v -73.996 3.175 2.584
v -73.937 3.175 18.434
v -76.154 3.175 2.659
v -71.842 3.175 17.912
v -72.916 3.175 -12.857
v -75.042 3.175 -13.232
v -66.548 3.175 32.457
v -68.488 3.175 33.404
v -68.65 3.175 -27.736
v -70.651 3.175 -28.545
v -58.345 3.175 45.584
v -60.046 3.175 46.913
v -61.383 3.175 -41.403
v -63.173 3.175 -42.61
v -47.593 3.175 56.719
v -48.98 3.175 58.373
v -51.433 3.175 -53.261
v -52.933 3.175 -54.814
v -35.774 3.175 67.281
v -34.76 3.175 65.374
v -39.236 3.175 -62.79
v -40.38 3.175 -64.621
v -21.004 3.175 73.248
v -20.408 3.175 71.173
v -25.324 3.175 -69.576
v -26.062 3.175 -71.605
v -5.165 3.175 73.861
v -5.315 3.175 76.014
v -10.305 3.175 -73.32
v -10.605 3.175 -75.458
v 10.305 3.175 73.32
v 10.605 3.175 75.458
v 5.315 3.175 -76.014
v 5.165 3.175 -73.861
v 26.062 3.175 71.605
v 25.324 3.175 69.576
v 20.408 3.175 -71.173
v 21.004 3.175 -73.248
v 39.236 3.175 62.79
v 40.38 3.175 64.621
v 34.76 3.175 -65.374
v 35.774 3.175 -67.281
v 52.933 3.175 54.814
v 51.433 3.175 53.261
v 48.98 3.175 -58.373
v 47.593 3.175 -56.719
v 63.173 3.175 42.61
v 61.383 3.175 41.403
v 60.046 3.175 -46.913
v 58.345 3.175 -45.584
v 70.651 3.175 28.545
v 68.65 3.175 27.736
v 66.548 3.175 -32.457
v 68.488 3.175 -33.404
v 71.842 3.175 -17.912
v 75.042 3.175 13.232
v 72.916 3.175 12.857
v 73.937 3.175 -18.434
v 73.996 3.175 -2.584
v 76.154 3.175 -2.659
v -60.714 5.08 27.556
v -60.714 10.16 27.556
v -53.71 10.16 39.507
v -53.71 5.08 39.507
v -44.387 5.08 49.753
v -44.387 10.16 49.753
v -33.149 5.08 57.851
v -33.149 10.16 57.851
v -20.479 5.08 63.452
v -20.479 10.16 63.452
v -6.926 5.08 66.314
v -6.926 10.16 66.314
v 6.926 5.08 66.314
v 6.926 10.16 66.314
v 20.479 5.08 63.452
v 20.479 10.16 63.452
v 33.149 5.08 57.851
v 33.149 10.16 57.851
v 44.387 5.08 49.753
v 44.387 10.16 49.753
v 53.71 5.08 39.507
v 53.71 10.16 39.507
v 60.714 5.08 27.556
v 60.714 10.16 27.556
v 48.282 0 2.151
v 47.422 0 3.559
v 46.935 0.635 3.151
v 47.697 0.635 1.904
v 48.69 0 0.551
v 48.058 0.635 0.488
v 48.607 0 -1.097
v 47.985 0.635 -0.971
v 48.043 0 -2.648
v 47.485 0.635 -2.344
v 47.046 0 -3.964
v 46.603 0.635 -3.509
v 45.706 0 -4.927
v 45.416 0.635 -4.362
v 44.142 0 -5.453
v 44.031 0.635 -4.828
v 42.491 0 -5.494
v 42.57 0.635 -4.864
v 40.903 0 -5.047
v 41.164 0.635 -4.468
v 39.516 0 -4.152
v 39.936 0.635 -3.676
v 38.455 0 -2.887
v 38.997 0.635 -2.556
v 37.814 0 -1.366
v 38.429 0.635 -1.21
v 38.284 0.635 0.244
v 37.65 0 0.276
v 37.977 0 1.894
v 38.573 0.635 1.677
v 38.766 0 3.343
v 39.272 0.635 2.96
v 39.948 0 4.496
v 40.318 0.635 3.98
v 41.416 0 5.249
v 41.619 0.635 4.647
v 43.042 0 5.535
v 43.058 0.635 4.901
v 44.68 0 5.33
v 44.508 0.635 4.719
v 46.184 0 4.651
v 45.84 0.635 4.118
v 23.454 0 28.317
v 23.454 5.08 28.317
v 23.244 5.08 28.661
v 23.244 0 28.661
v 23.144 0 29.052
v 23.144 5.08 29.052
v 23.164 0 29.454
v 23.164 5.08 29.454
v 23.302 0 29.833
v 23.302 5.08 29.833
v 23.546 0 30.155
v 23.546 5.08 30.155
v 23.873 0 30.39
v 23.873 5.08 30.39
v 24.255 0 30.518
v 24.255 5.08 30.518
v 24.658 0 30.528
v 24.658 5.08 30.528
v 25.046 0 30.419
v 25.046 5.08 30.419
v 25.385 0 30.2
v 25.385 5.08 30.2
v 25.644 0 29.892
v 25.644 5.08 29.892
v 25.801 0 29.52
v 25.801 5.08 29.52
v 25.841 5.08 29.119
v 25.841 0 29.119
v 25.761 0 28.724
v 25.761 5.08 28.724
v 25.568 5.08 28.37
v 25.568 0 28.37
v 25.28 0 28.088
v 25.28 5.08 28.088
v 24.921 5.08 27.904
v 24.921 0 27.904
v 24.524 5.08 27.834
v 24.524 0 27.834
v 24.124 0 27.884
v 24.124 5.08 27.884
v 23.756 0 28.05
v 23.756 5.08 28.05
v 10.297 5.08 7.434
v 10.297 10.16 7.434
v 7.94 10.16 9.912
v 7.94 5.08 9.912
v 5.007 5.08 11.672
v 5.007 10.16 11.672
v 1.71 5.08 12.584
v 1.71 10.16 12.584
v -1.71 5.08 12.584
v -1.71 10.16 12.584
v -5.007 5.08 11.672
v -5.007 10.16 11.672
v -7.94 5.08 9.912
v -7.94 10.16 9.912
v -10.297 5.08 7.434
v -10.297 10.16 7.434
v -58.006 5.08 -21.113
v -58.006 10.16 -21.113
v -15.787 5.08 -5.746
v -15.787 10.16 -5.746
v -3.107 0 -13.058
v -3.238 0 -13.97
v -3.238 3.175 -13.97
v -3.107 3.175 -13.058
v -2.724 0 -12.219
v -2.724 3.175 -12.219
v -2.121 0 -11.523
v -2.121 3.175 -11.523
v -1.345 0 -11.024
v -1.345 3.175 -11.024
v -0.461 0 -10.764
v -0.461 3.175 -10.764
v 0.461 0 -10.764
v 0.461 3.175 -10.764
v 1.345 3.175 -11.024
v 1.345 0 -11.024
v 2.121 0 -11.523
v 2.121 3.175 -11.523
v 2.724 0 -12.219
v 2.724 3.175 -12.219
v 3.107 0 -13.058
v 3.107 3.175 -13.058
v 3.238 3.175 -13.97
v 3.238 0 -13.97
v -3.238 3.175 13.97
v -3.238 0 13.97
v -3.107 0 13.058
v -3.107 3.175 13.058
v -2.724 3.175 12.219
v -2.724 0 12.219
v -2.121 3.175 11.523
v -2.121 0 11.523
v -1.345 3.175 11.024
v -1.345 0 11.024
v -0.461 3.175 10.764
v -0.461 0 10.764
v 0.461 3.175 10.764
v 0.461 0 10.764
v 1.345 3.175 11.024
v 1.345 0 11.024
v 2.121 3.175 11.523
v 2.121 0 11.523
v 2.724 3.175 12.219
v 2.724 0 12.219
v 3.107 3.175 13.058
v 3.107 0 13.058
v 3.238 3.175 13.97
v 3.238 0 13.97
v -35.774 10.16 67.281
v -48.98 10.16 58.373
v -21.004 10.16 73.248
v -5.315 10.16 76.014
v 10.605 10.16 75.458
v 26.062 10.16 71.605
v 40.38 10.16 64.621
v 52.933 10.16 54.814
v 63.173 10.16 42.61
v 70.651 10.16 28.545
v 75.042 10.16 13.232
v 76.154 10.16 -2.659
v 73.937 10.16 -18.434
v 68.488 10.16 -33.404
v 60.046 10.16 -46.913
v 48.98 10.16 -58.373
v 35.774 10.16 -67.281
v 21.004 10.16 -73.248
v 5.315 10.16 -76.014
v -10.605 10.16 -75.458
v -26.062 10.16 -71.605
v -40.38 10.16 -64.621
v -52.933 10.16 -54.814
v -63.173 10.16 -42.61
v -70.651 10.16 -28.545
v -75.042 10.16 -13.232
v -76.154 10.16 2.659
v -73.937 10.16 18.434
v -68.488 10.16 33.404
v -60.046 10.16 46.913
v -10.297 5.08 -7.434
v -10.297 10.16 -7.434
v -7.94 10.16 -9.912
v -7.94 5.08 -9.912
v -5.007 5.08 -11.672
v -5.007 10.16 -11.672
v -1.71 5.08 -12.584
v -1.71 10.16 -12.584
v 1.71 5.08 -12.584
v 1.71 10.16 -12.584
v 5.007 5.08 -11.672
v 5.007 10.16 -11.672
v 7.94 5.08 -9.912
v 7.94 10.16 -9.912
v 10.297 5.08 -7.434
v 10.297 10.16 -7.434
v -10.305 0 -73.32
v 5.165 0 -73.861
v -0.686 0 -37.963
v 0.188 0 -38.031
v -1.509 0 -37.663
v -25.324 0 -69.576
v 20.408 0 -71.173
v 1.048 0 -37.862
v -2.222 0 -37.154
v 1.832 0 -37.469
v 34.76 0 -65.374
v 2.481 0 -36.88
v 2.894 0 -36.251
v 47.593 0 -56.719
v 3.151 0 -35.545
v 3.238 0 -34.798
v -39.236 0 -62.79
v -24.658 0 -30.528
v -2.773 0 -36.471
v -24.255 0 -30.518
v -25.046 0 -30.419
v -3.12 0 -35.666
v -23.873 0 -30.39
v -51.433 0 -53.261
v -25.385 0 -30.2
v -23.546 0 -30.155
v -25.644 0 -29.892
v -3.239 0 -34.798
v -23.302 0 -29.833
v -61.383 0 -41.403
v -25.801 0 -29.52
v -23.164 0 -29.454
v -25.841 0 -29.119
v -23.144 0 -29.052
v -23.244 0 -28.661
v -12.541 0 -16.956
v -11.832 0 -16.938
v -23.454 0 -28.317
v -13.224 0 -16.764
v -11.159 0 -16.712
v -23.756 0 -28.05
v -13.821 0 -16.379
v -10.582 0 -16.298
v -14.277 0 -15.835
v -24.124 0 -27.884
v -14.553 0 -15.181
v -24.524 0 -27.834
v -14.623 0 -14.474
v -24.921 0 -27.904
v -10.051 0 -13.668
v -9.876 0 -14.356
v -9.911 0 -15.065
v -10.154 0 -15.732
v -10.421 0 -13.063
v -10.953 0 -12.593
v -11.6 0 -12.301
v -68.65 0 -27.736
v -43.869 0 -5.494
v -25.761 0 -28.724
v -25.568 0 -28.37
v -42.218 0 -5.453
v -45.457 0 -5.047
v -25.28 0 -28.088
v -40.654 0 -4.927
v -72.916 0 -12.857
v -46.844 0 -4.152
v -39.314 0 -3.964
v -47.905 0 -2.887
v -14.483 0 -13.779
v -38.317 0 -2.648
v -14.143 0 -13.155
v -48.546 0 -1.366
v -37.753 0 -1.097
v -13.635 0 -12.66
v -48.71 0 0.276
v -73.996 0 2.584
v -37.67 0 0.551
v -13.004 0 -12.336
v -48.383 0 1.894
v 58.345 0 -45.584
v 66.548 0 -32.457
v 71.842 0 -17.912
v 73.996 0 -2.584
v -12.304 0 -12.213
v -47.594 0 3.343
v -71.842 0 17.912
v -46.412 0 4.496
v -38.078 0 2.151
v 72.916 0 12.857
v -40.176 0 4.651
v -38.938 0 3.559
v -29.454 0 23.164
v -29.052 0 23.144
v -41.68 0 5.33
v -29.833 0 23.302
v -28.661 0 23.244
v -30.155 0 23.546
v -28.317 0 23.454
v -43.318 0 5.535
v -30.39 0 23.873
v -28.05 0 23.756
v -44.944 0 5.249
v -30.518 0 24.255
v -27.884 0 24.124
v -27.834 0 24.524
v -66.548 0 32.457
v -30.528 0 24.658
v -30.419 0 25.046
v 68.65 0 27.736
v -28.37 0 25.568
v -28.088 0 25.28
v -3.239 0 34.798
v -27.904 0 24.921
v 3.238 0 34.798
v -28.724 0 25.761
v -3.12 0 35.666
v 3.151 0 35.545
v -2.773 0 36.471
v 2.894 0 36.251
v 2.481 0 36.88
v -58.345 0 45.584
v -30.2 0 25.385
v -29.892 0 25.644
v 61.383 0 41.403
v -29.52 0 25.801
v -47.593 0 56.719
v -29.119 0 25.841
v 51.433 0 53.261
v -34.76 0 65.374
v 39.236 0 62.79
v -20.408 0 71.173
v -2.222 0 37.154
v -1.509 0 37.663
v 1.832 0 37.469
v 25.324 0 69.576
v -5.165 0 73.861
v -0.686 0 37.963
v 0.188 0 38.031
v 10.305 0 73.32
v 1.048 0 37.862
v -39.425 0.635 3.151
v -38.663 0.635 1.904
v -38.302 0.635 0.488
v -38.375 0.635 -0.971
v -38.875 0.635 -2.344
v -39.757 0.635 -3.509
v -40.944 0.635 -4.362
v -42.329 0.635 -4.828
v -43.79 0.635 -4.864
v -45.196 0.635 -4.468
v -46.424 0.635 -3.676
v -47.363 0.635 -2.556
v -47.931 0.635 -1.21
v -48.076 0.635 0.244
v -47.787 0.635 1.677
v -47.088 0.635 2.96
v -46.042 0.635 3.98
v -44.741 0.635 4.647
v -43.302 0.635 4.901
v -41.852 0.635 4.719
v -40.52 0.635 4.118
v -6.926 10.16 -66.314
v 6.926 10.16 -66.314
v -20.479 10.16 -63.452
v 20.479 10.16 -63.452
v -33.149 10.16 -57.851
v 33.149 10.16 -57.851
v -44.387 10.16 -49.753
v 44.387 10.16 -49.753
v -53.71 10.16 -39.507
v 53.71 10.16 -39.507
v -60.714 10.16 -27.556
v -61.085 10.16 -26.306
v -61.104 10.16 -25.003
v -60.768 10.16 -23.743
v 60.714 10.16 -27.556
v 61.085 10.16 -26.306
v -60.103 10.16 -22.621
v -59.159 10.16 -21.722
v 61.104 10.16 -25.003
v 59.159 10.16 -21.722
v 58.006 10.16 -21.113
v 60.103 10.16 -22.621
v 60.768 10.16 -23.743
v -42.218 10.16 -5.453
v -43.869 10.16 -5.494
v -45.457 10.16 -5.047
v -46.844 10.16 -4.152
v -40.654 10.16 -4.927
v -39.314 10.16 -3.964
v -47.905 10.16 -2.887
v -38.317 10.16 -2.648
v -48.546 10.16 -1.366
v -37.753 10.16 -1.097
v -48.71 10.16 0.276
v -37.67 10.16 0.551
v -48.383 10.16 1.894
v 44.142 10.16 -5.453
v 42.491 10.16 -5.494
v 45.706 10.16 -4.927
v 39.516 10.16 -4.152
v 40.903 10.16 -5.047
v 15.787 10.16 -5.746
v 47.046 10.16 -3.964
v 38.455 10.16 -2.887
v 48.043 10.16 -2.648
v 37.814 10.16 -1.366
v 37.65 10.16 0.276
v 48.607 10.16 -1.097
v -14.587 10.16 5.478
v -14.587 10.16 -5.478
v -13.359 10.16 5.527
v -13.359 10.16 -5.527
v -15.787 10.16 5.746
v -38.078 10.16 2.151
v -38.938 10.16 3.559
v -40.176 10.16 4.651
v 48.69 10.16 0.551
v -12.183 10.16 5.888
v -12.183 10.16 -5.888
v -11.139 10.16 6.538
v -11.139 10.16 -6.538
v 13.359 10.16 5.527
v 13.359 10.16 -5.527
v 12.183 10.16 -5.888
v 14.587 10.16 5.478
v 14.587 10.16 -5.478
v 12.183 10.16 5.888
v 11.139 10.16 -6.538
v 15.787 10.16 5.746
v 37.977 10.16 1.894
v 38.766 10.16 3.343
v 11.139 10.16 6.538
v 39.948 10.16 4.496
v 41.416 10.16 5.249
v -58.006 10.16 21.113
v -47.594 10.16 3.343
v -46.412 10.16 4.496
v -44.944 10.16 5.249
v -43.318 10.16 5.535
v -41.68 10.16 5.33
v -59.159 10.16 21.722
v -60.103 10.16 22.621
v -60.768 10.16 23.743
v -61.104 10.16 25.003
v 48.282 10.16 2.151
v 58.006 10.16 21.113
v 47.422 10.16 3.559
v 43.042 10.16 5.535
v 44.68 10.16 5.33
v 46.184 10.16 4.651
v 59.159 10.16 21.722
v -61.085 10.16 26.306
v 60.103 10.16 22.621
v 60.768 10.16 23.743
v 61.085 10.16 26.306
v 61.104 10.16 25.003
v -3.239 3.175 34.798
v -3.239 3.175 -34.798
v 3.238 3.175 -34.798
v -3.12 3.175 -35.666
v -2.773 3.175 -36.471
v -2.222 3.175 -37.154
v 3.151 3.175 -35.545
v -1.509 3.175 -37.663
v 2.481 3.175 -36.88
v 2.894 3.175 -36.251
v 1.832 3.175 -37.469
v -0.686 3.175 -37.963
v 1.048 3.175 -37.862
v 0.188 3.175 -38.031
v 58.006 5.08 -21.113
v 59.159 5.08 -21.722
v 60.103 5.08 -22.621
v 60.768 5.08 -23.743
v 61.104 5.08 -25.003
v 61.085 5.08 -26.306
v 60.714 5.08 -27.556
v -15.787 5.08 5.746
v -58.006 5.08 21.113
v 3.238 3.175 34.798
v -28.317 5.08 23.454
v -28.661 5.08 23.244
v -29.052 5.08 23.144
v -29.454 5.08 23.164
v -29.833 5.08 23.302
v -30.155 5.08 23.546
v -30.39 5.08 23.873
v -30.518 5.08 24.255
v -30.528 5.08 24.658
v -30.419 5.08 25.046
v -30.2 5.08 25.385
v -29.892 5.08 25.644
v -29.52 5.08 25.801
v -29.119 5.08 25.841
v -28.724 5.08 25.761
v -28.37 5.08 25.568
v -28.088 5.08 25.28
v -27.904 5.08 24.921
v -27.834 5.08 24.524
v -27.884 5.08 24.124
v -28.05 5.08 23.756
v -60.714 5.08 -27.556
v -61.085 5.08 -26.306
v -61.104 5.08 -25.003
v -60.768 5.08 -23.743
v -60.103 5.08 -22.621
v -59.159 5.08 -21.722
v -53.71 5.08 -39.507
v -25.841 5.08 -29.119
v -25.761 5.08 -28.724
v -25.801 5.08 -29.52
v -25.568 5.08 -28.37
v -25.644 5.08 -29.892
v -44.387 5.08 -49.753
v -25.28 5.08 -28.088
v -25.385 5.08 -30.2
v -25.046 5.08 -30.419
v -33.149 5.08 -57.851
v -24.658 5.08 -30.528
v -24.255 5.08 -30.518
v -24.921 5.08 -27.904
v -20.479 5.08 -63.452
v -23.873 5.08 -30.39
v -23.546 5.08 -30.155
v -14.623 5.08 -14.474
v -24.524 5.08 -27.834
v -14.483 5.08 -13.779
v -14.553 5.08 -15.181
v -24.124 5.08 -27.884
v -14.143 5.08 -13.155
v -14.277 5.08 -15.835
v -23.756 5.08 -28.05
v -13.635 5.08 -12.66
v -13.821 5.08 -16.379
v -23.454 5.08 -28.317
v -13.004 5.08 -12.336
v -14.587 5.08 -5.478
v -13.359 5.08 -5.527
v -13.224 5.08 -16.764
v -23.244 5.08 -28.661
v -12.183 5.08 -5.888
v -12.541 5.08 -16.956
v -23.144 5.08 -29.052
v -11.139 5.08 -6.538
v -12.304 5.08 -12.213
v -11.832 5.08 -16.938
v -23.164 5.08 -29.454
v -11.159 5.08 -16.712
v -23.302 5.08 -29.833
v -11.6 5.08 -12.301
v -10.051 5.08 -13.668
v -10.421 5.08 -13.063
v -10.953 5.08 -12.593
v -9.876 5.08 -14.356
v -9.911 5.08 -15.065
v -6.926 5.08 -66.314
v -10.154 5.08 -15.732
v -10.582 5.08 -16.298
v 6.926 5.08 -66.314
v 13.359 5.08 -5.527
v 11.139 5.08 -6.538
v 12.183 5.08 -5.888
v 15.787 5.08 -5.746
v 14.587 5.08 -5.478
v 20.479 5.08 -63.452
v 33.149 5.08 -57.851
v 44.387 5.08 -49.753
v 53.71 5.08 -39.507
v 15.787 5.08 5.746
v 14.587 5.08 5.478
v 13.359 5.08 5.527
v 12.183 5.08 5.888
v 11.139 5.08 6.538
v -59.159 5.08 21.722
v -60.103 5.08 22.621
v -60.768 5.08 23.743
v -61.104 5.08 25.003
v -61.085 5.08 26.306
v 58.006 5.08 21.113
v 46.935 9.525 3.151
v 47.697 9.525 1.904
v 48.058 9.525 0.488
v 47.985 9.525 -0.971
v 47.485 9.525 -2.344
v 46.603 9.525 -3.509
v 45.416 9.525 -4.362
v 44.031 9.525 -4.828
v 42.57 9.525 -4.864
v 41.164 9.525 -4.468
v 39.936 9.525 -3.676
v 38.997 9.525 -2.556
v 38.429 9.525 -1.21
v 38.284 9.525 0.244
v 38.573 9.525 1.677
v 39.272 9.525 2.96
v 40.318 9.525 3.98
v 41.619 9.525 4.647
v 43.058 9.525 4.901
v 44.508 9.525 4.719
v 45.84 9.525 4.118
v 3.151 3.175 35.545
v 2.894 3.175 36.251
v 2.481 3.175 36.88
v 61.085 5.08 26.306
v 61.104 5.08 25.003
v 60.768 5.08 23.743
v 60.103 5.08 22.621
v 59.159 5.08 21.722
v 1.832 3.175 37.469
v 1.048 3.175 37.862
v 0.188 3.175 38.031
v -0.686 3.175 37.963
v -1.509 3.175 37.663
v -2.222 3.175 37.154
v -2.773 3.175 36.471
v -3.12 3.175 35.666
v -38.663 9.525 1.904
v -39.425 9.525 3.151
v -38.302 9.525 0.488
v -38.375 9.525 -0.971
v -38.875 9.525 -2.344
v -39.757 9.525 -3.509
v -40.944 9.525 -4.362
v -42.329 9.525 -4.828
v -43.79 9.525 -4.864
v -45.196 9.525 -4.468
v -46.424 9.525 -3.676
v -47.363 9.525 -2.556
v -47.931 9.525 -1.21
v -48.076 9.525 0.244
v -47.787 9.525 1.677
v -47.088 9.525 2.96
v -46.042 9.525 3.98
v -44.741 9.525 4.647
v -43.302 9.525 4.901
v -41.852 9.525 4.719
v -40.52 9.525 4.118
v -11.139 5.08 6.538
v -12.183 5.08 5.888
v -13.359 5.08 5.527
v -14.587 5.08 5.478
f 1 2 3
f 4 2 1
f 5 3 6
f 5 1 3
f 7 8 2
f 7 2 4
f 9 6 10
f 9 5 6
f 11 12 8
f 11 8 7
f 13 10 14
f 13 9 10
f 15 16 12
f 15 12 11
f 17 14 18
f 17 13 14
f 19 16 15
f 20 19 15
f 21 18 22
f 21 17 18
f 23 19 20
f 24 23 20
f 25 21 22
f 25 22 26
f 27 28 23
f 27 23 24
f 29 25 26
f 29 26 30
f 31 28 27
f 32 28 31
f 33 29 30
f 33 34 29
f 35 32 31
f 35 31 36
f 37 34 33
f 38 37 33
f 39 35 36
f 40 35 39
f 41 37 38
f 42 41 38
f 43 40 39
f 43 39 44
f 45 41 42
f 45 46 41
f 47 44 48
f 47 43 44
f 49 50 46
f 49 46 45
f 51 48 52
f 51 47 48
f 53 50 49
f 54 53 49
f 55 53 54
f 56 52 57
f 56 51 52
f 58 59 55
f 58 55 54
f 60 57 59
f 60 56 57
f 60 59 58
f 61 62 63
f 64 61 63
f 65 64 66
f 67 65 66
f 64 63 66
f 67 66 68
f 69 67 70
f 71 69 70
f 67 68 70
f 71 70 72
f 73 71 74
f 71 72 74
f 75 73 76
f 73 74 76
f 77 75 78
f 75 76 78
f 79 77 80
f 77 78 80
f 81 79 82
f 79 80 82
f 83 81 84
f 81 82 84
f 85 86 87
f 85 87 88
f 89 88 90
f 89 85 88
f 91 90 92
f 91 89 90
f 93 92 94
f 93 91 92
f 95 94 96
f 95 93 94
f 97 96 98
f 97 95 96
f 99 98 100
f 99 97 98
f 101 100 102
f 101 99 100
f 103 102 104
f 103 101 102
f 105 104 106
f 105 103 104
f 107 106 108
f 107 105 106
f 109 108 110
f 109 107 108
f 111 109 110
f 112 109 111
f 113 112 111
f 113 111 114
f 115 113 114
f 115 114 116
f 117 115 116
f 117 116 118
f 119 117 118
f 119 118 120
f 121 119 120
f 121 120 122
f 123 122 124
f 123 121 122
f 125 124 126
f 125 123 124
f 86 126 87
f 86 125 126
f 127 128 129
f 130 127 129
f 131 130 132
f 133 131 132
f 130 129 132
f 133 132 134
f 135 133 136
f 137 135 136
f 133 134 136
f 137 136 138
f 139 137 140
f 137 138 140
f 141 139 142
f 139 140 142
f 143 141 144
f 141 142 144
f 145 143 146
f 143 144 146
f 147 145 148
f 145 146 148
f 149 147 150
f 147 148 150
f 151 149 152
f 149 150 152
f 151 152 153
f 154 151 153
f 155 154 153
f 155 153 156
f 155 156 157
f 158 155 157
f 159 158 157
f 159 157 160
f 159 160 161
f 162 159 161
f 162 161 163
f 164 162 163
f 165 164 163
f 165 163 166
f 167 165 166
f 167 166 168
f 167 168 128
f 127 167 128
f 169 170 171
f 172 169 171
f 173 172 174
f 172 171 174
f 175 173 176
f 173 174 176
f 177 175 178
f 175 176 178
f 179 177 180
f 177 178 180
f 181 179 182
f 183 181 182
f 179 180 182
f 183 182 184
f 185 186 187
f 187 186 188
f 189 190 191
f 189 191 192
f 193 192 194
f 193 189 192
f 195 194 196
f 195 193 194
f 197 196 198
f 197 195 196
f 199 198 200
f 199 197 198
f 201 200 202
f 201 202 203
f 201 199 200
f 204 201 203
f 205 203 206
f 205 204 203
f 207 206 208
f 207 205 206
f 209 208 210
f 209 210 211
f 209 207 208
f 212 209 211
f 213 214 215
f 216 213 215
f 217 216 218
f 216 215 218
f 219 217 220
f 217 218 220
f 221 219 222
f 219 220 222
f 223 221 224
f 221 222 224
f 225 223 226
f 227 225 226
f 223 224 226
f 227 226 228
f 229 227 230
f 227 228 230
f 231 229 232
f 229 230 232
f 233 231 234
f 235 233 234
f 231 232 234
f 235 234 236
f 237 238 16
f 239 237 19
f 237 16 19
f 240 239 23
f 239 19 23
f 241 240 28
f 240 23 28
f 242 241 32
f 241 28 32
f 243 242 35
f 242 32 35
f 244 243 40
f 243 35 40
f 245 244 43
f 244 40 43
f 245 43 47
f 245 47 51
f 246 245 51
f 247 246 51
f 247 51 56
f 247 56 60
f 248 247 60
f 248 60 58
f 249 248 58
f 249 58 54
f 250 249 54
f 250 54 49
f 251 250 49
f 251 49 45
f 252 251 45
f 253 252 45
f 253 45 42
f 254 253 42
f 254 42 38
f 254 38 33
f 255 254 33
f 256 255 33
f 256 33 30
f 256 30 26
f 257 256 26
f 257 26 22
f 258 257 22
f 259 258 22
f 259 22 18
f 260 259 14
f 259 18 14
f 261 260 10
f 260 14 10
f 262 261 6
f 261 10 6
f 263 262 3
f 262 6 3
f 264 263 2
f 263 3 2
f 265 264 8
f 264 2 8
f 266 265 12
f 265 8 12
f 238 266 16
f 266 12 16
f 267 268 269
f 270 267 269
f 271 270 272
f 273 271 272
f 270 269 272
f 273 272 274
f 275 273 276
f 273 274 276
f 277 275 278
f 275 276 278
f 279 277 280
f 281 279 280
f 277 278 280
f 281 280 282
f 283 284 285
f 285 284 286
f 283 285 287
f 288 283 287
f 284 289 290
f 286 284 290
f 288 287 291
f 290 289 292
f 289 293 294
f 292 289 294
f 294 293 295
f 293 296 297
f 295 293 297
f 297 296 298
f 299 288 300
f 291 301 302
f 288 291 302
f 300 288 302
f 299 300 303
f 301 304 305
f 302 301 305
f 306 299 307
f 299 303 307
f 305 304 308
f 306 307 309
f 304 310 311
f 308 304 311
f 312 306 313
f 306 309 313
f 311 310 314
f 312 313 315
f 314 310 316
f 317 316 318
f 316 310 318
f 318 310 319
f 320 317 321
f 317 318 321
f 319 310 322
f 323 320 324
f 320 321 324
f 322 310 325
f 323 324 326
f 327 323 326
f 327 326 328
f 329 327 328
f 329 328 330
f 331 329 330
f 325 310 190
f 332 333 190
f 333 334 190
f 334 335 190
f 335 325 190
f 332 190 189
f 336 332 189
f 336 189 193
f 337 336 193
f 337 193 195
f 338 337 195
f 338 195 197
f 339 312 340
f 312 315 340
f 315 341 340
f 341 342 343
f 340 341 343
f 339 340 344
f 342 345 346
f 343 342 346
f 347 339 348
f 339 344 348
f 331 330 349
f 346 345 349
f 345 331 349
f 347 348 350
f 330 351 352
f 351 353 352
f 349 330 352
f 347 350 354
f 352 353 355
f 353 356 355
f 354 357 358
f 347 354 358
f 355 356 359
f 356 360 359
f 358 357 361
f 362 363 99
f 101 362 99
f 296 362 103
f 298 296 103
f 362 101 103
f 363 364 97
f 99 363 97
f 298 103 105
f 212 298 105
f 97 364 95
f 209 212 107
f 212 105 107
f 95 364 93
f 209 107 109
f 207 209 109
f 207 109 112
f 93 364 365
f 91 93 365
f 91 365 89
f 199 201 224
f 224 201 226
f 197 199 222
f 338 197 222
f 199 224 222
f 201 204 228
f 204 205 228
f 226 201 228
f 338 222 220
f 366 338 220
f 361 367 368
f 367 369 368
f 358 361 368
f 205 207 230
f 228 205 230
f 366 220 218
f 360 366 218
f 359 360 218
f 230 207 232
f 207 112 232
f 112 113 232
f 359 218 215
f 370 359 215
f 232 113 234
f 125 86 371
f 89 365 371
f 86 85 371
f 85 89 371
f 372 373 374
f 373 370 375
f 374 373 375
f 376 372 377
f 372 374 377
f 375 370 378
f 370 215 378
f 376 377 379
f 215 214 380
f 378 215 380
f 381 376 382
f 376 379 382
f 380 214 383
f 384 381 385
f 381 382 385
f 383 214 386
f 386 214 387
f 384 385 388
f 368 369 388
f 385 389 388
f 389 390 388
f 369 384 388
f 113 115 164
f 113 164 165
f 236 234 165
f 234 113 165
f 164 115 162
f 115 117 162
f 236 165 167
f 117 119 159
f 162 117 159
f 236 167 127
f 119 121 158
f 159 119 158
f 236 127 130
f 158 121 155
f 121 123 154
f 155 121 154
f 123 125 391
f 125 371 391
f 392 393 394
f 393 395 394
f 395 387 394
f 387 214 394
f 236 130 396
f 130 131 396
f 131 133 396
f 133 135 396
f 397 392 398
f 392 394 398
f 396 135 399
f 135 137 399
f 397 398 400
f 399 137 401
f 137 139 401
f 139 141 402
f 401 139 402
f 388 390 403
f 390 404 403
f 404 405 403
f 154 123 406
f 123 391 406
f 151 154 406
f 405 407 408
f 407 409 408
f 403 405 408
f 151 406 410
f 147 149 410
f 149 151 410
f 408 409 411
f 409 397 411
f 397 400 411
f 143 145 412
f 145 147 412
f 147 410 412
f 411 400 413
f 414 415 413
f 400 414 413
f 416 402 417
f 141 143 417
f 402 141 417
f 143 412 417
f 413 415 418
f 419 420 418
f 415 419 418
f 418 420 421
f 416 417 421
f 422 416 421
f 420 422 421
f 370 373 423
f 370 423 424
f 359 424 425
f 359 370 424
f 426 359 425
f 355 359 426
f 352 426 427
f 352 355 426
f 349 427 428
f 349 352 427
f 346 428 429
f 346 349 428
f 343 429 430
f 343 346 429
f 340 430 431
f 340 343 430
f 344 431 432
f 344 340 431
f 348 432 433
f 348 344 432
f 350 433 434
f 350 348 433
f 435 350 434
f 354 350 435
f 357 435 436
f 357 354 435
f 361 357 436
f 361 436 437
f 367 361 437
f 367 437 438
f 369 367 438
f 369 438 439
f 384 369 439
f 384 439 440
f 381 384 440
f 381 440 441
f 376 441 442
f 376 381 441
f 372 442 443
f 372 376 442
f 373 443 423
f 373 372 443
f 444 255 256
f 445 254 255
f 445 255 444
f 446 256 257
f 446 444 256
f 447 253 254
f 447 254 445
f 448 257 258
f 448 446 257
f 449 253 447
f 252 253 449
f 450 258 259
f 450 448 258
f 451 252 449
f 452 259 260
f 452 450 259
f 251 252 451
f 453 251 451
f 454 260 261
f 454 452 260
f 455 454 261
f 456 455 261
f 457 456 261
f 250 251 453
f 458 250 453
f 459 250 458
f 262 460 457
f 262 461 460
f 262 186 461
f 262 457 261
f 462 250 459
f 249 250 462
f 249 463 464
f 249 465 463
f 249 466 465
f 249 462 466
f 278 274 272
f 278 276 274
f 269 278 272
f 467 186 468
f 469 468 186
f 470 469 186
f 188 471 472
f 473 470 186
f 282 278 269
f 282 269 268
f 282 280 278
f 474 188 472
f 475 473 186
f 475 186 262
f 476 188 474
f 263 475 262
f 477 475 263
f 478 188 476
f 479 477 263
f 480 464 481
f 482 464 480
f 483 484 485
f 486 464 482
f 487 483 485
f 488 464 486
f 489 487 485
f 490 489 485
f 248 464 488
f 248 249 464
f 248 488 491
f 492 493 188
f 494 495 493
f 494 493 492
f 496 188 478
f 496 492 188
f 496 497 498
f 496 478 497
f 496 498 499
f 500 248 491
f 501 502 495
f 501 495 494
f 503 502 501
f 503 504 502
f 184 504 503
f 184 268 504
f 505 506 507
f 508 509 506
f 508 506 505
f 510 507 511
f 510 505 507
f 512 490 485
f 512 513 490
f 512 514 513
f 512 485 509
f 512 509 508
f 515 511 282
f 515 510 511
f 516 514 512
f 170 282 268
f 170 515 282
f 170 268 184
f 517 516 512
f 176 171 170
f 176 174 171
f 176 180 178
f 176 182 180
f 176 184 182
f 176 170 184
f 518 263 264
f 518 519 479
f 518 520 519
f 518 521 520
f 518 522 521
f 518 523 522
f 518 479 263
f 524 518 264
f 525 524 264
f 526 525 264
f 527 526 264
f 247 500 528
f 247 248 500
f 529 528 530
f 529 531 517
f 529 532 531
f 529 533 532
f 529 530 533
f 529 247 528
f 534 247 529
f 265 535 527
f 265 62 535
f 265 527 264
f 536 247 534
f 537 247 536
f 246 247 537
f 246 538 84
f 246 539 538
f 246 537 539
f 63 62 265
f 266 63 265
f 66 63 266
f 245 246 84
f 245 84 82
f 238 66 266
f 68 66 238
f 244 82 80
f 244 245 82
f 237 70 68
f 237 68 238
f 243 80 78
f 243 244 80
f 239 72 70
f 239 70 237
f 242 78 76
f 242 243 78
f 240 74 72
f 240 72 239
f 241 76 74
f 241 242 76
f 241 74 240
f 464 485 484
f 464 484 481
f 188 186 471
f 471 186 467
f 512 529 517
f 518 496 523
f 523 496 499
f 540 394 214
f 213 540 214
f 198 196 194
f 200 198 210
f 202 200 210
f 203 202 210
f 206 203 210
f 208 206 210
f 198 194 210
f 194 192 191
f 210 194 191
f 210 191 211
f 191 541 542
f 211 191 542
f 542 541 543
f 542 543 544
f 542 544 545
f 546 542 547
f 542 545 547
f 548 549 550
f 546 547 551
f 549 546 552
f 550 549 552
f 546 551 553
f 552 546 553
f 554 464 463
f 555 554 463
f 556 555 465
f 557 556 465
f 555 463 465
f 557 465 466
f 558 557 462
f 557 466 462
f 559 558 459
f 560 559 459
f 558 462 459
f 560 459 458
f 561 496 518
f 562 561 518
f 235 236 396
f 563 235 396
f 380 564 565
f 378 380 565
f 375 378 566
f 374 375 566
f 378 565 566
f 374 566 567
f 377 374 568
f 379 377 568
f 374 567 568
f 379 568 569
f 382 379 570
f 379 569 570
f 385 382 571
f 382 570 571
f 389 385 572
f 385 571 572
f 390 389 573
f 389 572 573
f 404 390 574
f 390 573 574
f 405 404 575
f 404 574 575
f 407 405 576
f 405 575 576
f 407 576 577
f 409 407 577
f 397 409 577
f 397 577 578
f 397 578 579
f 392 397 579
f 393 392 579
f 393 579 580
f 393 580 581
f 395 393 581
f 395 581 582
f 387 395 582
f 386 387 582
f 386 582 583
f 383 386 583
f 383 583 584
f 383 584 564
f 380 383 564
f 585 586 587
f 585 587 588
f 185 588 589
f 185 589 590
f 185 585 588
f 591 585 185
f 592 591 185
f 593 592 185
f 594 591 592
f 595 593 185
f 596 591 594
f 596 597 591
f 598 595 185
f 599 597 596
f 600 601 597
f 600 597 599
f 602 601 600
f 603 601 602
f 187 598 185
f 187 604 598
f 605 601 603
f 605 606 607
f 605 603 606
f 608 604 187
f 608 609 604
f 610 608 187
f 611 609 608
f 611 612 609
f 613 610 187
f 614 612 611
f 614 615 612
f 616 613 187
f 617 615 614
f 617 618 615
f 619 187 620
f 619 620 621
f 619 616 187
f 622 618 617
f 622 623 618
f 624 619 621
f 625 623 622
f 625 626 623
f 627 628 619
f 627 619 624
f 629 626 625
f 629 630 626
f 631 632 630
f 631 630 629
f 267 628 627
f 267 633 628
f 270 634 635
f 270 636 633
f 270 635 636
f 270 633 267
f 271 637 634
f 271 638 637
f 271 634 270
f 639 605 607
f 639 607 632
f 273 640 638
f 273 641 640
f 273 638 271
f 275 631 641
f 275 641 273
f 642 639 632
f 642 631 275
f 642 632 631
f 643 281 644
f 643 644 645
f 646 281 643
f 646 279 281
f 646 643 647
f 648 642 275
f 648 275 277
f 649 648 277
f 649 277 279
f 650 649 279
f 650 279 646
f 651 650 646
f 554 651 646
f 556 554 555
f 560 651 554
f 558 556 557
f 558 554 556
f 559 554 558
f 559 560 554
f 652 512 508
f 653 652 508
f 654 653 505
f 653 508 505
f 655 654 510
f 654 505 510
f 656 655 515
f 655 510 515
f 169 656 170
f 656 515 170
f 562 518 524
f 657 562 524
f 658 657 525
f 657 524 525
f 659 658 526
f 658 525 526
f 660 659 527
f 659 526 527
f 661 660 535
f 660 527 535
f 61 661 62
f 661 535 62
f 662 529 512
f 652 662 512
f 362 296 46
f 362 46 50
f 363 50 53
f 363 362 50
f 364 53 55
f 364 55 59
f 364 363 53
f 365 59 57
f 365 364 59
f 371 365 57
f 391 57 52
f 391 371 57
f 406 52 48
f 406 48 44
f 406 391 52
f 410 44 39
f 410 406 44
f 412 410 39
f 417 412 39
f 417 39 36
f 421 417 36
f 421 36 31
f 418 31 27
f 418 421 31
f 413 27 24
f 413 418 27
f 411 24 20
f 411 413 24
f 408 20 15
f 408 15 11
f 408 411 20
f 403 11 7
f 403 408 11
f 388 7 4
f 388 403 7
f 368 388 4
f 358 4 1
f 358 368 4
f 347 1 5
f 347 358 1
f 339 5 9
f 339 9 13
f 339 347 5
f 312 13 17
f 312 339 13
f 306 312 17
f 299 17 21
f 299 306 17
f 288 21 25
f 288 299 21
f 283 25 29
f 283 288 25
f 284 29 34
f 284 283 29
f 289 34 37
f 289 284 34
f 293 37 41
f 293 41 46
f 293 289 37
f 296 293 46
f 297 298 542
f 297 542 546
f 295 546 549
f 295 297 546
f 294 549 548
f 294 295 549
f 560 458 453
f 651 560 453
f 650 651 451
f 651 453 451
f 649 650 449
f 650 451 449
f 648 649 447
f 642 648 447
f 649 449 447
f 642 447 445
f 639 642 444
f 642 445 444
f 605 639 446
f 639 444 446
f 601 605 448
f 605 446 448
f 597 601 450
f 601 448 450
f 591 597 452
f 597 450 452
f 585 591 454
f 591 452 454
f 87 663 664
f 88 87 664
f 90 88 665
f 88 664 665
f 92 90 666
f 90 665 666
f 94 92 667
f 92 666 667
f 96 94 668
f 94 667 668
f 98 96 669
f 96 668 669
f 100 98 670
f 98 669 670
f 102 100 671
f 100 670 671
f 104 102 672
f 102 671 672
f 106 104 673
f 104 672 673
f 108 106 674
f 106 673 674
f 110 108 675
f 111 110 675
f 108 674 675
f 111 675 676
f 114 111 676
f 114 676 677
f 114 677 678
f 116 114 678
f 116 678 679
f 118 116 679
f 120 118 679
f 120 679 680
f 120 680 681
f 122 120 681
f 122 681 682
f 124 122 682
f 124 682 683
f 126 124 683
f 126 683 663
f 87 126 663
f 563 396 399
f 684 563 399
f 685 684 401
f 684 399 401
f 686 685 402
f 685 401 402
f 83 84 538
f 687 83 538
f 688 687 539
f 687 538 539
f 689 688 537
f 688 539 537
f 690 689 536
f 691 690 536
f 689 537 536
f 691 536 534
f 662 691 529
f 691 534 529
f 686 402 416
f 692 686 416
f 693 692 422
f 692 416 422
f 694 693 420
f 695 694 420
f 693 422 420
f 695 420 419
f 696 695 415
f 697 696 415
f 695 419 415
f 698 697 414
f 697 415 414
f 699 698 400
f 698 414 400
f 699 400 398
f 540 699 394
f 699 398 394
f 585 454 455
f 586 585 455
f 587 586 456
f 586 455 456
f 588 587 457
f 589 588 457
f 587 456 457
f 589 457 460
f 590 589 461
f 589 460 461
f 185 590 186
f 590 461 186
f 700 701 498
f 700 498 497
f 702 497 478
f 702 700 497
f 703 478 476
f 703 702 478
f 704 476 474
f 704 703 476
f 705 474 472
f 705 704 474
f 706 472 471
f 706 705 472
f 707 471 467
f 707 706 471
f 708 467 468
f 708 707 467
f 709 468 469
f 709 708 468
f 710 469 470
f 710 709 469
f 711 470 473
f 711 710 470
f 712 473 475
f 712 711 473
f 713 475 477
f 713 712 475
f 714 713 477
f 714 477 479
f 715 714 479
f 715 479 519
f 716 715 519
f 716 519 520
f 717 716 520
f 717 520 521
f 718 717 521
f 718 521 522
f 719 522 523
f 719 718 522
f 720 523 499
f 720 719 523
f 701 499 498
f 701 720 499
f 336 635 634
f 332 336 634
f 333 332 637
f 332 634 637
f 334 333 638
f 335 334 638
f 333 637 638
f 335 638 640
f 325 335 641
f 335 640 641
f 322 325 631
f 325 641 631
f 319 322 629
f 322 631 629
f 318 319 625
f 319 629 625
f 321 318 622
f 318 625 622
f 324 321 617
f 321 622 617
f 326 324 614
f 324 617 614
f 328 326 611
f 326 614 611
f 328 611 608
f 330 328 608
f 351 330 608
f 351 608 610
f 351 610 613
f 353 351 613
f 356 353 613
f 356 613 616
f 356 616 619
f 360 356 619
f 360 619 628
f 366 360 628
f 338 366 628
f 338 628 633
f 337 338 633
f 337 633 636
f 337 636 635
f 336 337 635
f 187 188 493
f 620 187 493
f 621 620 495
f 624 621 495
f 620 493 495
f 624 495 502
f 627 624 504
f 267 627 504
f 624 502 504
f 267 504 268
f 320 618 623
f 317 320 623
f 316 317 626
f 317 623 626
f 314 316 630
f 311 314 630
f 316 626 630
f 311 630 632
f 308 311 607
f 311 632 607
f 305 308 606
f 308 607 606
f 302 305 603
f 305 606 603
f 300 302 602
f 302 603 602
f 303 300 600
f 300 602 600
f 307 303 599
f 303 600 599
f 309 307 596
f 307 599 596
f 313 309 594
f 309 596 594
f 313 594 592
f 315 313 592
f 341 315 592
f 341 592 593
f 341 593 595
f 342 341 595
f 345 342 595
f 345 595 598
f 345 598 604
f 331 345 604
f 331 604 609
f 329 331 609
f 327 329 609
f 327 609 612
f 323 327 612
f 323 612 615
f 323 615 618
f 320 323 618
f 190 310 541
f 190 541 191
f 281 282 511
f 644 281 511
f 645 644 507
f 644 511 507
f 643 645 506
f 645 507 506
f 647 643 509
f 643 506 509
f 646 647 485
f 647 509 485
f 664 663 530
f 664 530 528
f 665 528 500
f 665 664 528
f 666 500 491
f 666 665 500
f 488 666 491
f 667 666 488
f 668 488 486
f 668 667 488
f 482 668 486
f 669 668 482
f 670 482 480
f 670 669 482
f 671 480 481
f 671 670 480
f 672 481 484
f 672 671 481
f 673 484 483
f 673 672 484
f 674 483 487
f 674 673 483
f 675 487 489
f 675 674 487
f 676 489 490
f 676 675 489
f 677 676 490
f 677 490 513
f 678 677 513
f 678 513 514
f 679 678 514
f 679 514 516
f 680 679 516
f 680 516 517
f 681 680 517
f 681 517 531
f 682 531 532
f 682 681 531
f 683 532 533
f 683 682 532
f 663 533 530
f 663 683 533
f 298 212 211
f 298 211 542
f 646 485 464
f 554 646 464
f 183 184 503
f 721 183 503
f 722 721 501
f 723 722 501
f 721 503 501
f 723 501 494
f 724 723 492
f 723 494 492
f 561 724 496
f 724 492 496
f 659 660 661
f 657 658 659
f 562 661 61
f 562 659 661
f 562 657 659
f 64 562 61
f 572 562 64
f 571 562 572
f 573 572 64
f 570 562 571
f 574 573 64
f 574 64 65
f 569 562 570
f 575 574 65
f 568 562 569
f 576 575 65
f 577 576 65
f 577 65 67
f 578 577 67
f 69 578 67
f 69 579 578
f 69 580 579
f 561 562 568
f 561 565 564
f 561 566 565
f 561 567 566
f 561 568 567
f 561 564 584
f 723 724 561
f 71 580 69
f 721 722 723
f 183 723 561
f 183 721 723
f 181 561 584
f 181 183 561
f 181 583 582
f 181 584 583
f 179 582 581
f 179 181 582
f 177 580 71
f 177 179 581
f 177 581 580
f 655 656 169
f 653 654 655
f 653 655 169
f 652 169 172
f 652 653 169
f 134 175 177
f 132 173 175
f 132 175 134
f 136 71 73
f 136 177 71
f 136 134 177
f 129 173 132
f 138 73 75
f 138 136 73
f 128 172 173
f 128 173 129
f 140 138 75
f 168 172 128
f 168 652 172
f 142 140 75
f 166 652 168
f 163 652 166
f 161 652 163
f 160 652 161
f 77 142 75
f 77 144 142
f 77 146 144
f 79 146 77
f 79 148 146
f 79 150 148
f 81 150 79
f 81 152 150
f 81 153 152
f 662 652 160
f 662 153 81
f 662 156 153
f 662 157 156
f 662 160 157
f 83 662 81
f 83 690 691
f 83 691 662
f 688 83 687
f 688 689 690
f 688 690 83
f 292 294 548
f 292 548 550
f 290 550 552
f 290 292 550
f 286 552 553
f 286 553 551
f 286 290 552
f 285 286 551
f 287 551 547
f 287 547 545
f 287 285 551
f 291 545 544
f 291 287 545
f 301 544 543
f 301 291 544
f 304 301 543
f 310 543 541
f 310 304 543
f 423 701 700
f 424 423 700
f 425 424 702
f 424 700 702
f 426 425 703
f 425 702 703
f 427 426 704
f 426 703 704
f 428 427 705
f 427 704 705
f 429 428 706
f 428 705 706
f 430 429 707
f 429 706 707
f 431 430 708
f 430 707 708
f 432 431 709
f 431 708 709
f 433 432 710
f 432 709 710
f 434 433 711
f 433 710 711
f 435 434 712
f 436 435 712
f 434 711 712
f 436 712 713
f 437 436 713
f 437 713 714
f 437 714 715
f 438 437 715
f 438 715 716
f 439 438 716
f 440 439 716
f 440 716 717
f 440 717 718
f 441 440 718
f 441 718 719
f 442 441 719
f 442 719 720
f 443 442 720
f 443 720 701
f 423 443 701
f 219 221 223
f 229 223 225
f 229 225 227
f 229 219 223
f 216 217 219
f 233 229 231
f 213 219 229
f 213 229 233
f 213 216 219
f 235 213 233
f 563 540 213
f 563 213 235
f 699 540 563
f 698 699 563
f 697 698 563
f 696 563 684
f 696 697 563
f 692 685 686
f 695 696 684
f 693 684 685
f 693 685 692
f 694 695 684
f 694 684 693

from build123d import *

# Parameters (mm, degrees)
SKETCH1_R                      = 76.2
BOSS_EXTRUDE1_DEPTH            = 10.16
TAP_DRILL_FOR_6_32_TAP1_D      = 2.7051
CIRPATTERN1_COUNT              = 4
W_0_386_DIAMETER_HOLE1_D       = 9.8044
F_3_16_0_1875_DIAMETER_HOLE1_D = 4.7625
CUT_EXTRUDE4_DEPTH             = 3.175
SKETCH15_R                     = 76.2
SKETCH15_R_2                   = 74.041
CUT_EXTRUDE5_DEPTH             = 3.175
CUT_EXTRUDE7_DEPTH             = 5.08
BODY_MOVE_COPY1_ANGLE          = 40
CHAMFER1_SIZE                  = 0.635


with BuildPart() as part:
    # Sketch1 → Boss-Extrude1 (new body)
    with BuildSketch(Plane(origin=(0, 0, 0), x_dir=(1, 0, 0), z_dir=(0, 1, 0))):
        with Locations(Location((0, 0, 0), (0, 0, 270))):
            Circle(SKETCH1_R)
    extrude(amount=BOSS_EXTRUDE1_DEPTH)

    # Tap Drill for #6-32 Tap1 (through all)
    with Locations(Plane(origin=(0, 0, 0), x_dir=(-1, 0, 0), z_dir=(0, -1, 0))):
        with Locations((37.52117539, 6.615995569)):
            tap_drill_for_6_32_tap1 = Hole(TAP_DRILL_FOR_6_32_TAP1_D / 2)

    # CirPattern1: Tap Drill for #6-32 Tap1 ×4 about axis, 1 skipped
    cirpattern1_axis = Axis((0, 0, 0), (0, 1, 0))
    add([tap_drill_for_6_32_tap1.rotate(cirpattern1_axis, i * 360 / CIRPATTERN1_COUNT) for i in range(1, CIRPATTERN1_COUNT) if i not in (3,)], mode=Mode.SUBTRACT)

    # W (0.386) Diameter Hole1 (through all)
    with Locations(Plane(origin=(0, 0, 0), x_dir=(-1, 0, 0), z_dir=(0, -1, 0))):
        with Locations((-33.077799054, 27.755568986), (33.077799054, -27.755568986)):
            Hole(W_0_386_DIAMETER_HOLE1_D / 2)

    # 3/16 (0.1875) Diameter Hole1 (through all)
    with Locations(Plane(origin=(0, 0, 0), x_dir=(-1, 0, 0), z_dir=(0, -1, 0))):
        with Locations((18.760587695, 3.307997785)):
            Hole(F_3_16_0_1875_DIAMETER_HOLE1_D / 2)

    # Sketch12 → Cut-Extrude4 (cut)
    with BuildSketch(Plane.XZ):
        with BuildLine():
            ThreePointArc((24.848558171, 24.575146858), (20.286055568, 24.175979603), (19.886888313, 28.738482206))
            Line((19.886888313, 28.738482206), (6.498907978, 12.783308544))
            ThreePointArc((6.498907978, 12.783308544), (10.087375141, 13.744835423), (12.218242907, 10.70164087))
            ThreePointArc((12.218242907, 10.70164087), (12.02293746, 9.594008636), (11.460577836, 8.619973196))
            Line((11.460577836, 8.619973196), (24.848558171, 24.575146858))
        make_face()
        with BuildLine():
            ThreePointArc((25.606223242, 26.656814532), (23.475355476, 29.700009084), (19.886888313, 28.738482206))
            Line((19.886888313, 28.738482206), (24.848558171, 24.575146858))
            ThreePointArc((24.848558171, 24.575146858), (25.410917794, 25.549182297), (25.606223242, 26.656814532))
        make_face()
        with BuildLine():
            Line((24.848558171, 24.575146858), (19.886888313, 28.738482206))
            ThreePointArc((19.886888313, 28.738482206), (20.286055568, 24.175979603), (24.848558171, 24.575146858))
        make_face()
        with BuildLine():
            ThreePointArc((12.218242907, 10.70164087), (10.087375141, 13.744835423), (6.498907978, 12.783308544))
            Line((6.498907978, 12.783308544), (11.460577836, 8.619973196))
            ThreePointArc((11.460577836, 8.619973196), (12.02293746, 9.594008636), (12.218242907, 10.70164087))
        make_face()
        with BuildLine():
            Line((11.460577836, 8.619973196), (6.498907978, 12.783308544))
            ThreePointArc((6.498907978, 12.783308544), (6.898075233, 8.220805941), (11.460577836, 8.619973196))
        make_face()
    cut_extrude4 = extrude(amount=-CUT_EXTRUDE4_DEPTH, mode=Mode.SUBTRACT)

    # Mirror1: Cut-Extrude4 across plane
    add(cut_extrude4.mirror(Plane(origin=(0, 0, 0), x_dir=(-0.7660444431189792, 0, 0.6427876096865378), z_dir=(0.6427876096865379, 0, 0.7660444431189792))), mode=Mode.SUBTRACT)

    # Sketch15 → Cut-Extrude5 (cut)
    with BuildSketch(Plane.XZ):
        with Locations(Location((0, 0, 0), (0, 0, 270))):
            Circle(SKETCH15_R)
        with Locations(Location((0, 0, 0), (0, 0, 270))):
            Circle(SKETCH15_R_2, mode=Mode.SUBTRACT)
    extrude(amount=-CUT_EXTRUDE5_DEPTH, mode=Mode.SUBTRACT)

    # Sketch20 → Cut-Extrude7 (cut)
    with BuildSketch(Plane(origin=(0, 10.16, 0), x_dir=(1, 0, 0), z_dir=(0, 1, 0))):
        with BuildLine():
            Line((58.006337644, 21.112580301), (15.787325383, 5.746116518))
            ThreePointArc((15.787325383, 5.746116518), (13.41810781, 3.858627578), (12.666324636, 0.92424034))
            ThreePointArc((12.666324636, 0.92424034), (8.163402625, -9.728764443), (-3.109683289, -12.313402042))
            ThreePointArc((-3.109683289, -12.313402042), (-6.130036388, -12.544212982), (-8.400260426, -14.549677855))
            Line((-8.400260426, -14.549677855), (-30.864527746, -53.458930208))
            ThreePointArc((-30.864527746, -53.458930208), (-31.28945063, -57.248955123), (-28.797011077, -60.135578304))
            ThreePointArc((-28.797011077, -60.135578304), (42.857863777, -51.076013328), (64.222532311, 17.917085938))
            ThreePointArc((64.222532311, 17.917085938), (61.812570917, 20.872916849), (58.006337644, 21.112580301))
        make_face()
        with BuildLine():
            Line((8.400260408, 14.549677823), (30.864527463, 53.458929718))
            ThreePointArc((30.864527463, 53.458929718), (31.289450636, 57.248955104), (28.797010604, 60.135578531))
            ThreePointArc((28.797010604, 60.135578531), (-42.857863971, 51.076013165), (-64.222532316, -17.91708592))
            ThreePointArc((-64.222532316, -17.91708592), (-61.812570882, -20.872916867), (-58.006337553, -21.112580268))
            Line((-58.006337553, -21.112580268), (-15.787325417, -5.746116531))
            ThreePointArc((-15.787325417, -5.746116531), (-13.418107797, -3.858627558), (-12.666324642, -0.924240256))
            ThreePointArc((-12.666324642, -0.924240256), (-8.16340261, 9.728764456), (3.109683246, 12.313402053))
            ThreePointArc((3.109683246, 12.313402053), (6.130036351, 12.544212967), (8.400260408, 14.549677823))
        make_face()
    extrude(amount=-CUT_EXTRUDE7_DEPTH, mode=Mode.SUBTRACT)


with BuildPart() as part_1:
    # Body-Move/Copy1: moved
    add(part.part.rotate(Axis((0, 0, 0), (0, -1, 0)), BODY_MOVE_COPY1_ANGLE))

    # Chamfer1
    chamfer1_edges = [part_1.edges().sort_by_distance(p)[0] for p in [
        (-46.935303069, 0, -3.15107342),
        (-46.935303069, 10.16, -3.15107342),
        (39.424696931, 0, -3.15107342),
        (39.424696931, 10.16, -3.15107342),
    ]]
    chamfer(chamfer1_edges, length=CHAMFER1_SIZE)


solid = part_1.part
